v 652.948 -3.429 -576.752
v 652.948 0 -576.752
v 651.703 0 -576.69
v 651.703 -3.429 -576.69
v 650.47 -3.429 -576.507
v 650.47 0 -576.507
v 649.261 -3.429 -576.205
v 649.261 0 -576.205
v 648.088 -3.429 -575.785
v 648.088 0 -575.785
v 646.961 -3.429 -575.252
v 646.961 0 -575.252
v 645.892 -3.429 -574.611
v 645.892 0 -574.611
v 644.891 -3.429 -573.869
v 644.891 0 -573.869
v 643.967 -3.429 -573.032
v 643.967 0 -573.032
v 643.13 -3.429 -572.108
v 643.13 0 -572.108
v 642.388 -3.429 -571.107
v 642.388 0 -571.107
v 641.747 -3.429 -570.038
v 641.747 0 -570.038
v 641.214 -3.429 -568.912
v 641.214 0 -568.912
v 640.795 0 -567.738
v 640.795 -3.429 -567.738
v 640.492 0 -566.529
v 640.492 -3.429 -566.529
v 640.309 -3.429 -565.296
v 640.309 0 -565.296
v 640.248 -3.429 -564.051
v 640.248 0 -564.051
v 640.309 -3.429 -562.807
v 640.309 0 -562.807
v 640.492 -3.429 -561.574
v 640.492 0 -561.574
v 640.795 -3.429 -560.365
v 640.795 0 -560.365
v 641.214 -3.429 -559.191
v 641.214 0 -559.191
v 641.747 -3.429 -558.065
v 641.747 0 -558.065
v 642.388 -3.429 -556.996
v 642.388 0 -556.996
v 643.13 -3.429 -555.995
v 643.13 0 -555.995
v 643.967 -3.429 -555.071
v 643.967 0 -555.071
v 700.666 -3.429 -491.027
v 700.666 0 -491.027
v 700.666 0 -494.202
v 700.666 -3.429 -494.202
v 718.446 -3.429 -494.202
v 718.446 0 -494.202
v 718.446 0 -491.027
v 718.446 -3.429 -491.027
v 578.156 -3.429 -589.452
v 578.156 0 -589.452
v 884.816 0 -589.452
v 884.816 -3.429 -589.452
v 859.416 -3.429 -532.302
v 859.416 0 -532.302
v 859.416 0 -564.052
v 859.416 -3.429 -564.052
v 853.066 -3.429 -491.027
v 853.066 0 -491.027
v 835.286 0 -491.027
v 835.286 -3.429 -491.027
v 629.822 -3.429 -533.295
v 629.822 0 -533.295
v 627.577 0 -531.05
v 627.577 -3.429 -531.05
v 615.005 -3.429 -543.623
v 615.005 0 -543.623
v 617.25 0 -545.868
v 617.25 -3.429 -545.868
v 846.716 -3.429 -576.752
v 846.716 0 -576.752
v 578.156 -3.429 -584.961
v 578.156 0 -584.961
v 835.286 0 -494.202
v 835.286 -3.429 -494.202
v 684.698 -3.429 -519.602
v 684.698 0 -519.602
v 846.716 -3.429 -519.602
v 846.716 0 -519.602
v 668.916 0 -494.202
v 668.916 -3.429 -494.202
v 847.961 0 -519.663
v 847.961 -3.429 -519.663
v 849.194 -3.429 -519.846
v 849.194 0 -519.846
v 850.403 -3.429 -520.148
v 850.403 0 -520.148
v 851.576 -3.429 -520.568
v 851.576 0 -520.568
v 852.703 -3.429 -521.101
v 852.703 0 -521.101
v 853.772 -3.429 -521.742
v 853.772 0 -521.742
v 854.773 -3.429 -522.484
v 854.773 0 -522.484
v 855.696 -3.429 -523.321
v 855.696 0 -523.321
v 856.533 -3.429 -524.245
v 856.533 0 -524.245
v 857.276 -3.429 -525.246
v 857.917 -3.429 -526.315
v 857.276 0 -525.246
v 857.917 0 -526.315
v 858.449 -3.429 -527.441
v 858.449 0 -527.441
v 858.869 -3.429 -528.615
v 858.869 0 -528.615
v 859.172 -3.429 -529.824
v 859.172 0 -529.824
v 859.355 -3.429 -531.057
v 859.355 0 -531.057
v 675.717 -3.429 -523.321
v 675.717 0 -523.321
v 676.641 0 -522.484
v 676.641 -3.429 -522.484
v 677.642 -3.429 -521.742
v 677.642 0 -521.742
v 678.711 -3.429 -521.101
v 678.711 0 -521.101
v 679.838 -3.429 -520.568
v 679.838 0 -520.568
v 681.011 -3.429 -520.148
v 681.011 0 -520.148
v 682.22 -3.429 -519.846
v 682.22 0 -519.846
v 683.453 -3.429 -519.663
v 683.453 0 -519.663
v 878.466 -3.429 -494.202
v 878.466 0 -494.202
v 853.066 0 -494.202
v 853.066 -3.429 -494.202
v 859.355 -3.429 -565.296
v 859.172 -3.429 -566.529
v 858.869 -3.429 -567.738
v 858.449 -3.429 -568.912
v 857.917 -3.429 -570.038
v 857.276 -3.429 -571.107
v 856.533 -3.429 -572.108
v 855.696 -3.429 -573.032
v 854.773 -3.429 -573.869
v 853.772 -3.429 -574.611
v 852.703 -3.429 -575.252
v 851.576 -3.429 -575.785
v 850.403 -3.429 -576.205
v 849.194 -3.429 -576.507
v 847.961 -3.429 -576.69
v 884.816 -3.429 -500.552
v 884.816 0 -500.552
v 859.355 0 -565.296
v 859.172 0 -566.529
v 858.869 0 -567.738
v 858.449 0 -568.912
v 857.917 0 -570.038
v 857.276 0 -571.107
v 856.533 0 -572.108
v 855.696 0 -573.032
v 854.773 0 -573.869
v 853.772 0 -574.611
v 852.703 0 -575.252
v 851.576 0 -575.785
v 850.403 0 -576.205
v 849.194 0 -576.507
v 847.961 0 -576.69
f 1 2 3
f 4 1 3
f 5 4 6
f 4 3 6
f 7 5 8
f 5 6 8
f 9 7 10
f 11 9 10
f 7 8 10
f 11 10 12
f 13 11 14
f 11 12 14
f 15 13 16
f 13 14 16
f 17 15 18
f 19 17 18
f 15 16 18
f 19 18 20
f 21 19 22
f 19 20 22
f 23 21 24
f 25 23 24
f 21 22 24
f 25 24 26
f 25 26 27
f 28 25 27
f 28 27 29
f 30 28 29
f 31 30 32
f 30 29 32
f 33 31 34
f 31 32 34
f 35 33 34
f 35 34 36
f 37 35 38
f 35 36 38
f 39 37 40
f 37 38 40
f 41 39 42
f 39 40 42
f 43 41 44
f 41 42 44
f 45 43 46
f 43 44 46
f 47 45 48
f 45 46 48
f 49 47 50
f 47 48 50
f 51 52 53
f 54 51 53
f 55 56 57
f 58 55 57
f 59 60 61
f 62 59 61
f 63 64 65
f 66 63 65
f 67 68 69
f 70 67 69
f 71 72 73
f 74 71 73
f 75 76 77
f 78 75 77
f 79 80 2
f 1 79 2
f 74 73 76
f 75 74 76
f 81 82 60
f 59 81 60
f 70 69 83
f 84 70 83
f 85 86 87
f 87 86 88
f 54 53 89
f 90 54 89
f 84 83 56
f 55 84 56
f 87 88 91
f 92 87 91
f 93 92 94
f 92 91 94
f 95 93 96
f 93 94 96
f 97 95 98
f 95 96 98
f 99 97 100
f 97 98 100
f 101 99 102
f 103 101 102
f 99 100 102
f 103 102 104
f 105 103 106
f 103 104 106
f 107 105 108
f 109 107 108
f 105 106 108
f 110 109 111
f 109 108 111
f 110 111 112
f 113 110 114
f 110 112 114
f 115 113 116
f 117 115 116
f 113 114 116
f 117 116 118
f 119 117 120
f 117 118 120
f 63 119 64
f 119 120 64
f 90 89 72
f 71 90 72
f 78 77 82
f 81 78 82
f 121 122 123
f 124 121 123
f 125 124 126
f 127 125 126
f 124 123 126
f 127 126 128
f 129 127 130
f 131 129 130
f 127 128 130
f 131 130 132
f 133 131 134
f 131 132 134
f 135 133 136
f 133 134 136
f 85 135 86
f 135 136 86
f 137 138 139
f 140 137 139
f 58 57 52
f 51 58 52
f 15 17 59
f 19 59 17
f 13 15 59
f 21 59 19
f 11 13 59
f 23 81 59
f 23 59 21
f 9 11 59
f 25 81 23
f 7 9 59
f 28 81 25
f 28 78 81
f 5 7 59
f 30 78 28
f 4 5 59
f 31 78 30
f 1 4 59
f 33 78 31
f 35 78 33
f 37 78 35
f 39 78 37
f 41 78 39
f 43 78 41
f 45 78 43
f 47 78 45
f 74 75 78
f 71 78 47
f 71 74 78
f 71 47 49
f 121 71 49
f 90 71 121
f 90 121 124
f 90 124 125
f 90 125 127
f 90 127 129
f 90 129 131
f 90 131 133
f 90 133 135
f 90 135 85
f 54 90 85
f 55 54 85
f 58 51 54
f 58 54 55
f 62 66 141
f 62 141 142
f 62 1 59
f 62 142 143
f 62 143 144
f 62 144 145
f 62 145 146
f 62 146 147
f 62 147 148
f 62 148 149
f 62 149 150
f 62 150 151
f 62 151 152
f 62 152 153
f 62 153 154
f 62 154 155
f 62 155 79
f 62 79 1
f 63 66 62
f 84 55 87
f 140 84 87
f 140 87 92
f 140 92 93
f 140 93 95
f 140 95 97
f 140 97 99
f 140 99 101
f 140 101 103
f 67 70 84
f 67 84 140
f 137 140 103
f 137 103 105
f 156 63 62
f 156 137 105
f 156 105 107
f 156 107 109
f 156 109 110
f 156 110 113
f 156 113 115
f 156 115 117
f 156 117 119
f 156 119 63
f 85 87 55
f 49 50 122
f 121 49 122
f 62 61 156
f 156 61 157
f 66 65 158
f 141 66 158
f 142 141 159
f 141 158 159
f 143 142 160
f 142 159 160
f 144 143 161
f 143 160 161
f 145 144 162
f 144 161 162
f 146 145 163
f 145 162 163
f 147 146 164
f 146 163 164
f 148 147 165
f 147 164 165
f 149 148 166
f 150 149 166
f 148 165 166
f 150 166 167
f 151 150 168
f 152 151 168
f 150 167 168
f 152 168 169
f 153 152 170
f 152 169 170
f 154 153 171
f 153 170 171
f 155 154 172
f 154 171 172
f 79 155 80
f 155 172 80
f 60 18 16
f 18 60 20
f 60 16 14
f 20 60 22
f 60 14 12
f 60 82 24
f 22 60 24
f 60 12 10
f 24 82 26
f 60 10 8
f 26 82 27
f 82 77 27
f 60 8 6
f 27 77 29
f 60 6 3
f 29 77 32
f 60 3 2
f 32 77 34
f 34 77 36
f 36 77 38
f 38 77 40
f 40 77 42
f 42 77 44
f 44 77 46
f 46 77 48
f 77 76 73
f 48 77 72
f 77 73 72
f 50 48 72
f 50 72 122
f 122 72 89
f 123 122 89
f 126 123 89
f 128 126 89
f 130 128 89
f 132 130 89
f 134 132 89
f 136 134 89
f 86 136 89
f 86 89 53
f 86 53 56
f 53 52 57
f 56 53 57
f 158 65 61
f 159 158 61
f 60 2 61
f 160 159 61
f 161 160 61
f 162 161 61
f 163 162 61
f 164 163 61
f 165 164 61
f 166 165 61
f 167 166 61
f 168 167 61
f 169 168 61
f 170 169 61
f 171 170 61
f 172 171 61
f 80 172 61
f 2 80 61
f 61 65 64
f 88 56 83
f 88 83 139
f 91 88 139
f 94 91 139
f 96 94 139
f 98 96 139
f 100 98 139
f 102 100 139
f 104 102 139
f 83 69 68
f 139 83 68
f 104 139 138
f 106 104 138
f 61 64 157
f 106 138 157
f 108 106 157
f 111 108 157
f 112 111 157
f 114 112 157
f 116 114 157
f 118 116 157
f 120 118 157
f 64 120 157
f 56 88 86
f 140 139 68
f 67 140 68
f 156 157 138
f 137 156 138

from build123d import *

# Parameters (mm, degrees)
F1_DEPTH = 3.429


# Not quite as in the source:
# - ends of sketch curves that miss each other by under 0.0002 mm in the source are joined


with BuildPart() as f1:
    # F0 (on Front) → F1 (new body)
    with BuildSketch(Plane.XZ):
        Polygon((718.4461374, -491.0265008), (700.6661374, -491.0265008), (700.6661374, -494.2015008), (668.9161374, -494.2015008), (629.8223878, -533.2952504), (627.5773072, -531.0501952), (615.0049422, -543.6225348), (617.2500228, -545.8676154), (578.1562732, -584.961365), (578.1562732, -589.4515008), (884.8161374, -589.4515008), (884.8161374, -500.5515008), (878.4661374, -494.2015008), (853.0661374, -494.2015008), (853.0661374, -491.0265008), (835.2861374, -491.0265008), (835.2861374, -494.2015008), (718.4461374, -494.2015008), align=None)
        with BuildLine():
            ThreePointArc((859.4161374, -564.0515008), (855.6963935211, -573.0317569211), (846.7161374, -576.7515008))
            Line((846.7161374, -576.7515008), (652.9476654, -576.7515008))
            ThreePointArc((652.9476654, -576.7515008), (641.2143919005, -568.9115720944), (643.9674219789, -555.0712319789))
            Line((643.9674219789, -555.0712319789), (675.7174192, -523.3212292))
            ThreePointArc((675.7174192, -523.3212292), (679.8375941056, -520.5682273005), (684.6976654, -519.6015008))
            Line((684.6976654, -519.6015008), (846.7161374, -519.6015008))
            ThreePointArc((846.7161374, -519.6015008), (855.6963935211, -523.3212446789), (859.4161374, -532.3015008))
            Line((859.4161374, -532.3015008), (859.4161374, -564.0515008))
        make_face(mode=Mode.SUBTRACT)
    extrude(amount=F1_DEPTH)


solid = f1.part
